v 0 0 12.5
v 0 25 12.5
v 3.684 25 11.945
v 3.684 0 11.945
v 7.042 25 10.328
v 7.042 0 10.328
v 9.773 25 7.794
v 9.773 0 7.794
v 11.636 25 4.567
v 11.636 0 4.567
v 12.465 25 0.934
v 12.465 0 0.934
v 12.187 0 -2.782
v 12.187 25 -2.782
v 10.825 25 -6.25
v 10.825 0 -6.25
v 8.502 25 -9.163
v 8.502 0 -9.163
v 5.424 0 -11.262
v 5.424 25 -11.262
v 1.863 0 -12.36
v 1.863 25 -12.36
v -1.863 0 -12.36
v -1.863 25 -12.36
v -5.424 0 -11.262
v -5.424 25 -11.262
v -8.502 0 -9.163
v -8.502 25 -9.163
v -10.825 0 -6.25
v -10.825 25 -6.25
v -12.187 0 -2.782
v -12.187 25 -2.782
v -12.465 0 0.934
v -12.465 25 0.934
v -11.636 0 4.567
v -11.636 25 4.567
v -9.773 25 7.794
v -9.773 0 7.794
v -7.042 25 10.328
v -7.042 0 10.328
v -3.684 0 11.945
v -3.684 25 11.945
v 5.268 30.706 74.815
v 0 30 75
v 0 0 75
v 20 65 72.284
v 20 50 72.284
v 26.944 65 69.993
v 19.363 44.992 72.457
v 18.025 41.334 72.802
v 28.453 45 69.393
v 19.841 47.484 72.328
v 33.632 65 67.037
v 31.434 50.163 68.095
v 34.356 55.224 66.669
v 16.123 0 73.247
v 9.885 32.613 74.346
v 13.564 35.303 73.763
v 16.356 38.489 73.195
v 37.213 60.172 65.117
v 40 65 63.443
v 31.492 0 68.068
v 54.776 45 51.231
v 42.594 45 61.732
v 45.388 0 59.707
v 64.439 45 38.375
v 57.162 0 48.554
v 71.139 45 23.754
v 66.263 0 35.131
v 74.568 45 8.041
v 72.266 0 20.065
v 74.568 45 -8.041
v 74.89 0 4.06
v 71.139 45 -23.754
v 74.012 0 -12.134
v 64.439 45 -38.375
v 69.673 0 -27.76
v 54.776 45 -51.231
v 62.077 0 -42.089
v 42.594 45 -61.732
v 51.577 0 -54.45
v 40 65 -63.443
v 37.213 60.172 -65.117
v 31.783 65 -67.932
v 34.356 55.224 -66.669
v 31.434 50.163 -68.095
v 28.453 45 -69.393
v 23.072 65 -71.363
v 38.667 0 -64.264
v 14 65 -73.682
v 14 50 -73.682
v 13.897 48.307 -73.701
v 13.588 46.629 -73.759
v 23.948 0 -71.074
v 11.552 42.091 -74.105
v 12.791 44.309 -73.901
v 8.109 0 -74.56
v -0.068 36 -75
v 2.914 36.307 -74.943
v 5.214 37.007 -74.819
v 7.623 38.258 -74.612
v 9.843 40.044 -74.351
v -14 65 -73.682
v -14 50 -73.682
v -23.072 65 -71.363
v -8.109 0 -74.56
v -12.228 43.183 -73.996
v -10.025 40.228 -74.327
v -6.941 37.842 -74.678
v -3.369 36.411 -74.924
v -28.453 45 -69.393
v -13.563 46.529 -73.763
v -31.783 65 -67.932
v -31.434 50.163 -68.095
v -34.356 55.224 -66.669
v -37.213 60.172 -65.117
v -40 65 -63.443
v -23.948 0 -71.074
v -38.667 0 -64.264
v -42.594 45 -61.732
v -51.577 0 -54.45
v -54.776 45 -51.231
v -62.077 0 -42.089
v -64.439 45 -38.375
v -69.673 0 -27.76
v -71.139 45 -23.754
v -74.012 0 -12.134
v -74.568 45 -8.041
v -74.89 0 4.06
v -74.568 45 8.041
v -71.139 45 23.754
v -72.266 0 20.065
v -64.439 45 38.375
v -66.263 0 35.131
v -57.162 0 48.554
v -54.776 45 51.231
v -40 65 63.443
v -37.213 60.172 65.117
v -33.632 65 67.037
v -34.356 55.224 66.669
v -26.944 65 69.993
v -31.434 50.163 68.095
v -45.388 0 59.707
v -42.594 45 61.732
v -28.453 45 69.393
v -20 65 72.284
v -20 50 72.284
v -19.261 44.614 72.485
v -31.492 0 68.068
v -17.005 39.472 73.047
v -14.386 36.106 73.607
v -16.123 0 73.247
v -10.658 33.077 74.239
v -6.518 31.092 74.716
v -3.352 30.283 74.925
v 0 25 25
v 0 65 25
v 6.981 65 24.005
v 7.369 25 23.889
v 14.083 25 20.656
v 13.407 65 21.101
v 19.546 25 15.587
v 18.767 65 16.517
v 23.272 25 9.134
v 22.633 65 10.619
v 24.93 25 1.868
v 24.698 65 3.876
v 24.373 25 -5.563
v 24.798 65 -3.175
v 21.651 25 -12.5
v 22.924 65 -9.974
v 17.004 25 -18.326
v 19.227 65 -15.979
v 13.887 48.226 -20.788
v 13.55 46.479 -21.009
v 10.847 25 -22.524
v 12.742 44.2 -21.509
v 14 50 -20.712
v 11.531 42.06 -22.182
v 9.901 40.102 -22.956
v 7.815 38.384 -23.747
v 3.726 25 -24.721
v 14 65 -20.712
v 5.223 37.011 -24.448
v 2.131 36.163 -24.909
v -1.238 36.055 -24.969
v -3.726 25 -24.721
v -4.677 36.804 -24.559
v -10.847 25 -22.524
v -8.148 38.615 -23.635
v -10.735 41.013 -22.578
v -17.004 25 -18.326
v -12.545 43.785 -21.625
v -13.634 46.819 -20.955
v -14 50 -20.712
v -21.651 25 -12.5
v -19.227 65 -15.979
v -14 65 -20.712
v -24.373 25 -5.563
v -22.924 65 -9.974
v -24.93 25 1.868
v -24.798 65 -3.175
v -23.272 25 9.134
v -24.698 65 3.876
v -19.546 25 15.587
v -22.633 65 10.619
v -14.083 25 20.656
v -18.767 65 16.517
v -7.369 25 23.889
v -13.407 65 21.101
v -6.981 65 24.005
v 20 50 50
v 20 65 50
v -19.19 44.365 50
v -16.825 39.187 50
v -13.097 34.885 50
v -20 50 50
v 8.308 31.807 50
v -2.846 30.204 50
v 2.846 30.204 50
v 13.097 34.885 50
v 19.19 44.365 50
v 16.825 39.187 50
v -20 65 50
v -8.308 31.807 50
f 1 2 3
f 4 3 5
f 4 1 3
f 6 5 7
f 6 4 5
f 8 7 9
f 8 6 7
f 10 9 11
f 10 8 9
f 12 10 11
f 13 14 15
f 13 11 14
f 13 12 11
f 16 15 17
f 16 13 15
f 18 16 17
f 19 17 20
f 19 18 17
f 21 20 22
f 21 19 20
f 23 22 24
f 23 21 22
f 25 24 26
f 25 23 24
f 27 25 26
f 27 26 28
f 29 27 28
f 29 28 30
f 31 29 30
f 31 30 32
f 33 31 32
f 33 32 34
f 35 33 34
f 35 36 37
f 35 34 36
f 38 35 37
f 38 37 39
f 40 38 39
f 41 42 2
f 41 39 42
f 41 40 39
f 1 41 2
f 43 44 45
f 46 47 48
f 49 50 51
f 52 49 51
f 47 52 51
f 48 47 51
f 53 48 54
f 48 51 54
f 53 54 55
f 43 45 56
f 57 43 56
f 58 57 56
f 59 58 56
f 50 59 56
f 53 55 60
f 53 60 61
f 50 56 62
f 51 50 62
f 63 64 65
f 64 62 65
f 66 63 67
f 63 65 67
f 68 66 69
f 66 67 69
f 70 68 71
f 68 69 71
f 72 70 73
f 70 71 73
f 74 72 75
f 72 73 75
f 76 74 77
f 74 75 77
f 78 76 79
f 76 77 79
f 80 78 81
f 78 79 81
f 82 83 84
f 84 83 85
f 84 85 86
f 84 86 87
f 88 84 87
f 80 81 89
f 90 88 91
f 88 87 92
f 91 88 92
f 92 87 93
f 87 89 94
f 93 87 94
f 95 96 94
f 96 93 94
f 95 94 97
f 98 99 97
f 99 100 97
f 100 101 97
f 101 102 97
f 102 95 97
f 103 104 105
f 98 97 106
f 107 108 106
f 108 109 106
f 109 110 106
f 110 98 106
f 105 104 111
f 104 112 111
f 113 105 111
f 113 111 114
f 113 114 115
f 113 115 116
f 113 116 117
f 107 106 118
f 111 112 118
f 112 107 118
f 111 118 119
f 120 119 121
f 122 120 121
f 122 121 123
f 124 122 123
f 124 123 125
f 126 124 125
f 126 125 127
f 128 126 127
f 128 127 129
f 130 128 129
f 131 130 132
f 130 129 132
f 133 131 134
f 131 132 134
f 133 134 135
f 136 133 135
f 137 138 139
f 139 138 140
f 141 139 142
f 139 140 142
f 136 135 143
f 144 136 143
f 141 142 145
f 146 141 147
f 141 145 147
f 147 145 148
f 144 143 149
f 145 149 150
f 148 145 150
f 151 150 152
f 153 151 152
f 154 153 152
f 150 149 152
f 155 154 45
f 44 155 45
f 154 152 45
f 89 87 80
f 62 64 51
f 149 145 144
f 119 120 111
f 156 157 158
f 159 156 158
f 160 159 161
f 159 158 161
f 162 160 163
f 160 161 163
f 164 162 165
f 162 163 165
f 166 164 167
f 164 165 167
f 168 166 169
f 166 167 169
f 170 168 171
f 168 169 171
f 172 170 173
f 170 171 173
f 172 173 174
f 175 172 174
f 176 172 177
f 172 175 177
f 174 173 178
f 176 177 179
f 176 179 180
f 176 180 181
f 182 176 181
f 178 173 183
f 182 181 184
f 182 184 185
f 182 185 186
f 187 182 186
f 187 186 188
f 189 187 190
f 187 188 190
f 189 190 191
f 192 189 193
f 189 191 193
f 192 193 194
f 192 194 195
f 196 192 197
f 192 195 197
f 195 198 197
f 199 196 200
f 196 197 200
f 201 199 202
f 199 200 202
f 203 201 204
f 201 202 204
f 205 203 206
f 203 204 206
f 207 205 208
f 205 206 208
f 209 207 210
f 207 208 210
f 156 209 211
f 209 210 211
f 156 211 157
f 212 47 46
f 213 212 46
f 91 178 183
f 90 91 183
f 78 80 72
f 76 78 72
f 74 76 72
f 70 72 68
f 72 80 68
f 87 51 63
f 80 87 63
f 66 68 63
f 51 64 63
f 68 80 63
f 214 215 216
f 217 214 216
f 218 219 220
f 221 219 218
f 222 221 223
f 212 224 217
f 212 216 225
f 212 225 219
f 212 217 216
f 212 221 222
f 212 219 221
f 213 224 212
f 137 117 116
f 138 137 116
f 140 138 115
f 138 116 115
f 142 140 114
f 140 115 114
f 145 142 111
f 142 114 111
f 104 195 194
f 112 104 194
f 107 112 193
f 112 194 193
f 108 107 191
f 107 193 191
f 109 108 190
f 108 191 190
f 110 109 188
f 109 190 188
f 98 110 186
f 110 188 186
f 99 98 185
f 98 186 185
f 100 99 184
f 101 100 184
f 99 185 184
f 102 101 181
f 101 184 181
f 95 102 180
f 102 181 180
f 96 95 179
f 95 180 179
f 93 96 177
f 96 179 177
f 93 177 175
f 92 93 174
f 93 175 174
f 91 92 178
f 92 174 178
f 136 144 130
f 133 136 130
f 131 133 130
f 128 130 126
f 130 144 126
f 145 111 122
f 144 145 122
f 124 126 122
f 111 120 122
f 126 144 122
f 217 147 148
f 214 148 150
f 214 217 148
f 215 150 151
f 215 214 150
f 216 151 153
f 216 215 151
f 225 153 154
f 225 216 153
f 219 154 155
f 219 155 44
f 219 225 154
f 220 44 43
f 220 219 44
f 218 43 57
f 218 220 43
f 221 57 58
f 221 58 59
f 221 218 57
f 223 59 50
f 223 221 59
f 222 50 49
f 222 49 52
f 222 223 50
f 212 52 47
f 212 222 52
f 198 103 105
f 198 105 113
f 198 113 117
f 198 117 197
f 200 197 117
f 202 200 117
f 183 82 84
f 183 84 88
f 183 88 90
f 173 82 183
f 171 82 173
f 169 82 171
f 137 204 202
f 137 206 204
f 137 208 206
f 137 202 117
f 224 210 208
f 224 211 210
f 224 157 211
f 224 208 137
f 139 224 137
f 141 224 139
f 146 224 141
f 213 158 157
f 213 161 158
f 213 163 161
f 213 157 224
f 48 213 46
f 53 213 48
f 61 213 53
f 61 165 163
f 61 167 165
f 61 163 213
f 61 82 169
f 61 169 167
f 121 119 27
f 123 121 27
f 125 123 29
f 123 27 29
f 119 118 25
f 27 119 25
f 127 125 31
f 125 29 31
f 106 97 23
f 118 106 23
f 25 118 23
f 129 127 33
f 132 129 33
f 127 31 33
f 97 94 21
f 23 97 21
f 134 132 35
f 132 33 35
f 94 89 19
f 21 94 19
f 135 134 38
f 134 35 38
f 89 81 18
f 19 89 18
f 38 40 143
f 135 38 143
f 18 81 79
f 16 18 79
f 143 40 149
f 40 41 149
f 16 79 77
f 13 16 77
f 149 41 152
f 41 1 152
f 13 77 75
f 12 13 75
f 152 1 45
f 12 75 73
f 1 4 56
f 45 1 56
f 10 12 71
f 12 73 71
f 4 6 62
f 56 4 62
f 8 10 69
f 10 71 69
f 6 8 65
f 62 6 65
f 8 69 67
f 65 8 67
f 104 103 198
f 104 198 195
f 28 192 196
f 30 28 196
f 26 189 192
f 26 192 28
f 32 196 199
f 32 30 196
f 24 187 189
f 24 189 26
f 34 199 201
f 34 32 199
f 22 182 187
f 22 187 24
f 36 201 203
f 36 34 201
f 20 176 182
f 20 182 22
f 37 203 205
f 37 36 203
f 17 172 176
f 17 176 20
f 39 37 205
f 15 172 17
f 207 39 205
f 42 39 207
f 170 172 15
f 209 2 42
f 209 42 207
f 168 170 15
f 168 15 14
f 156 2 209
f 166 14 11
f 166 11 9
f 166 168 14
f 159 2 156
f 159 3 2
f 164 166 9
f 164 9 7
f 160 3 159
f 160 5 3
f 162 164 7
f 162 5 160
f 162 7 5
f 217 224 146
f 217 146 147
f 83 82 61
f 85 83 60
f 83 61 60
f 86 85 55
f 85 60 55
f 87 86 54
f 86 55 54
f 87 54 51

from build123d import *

# Parameters (mm, degrees)
SKETCH2_R           = 75
SKETCH2_R_2         = 12.5
BOSS_EXTRUDE1_DEPTH = 65
SKETCH3_R           = 14
CUT_EXTRUDE1_DEPTH  = 89
SKETCH4_R           = 25
CUT_EXTRUDE2_DEPTH  = 40
CUT_EXTRUDE3_DEPTH  = 97.5
SKETCH7_R           = 20
CUT_EXTRUDE4_DEPTH  = 73


with BuildPart() as part:
    # Sketch2 → Boss-Extrude1 (new body)
    with BuildSketch(Plane(origin=(0, 0, 0), x_dir=(1, 0, 0), z_dir=(0, 1, 0))):
        with Locations(Location((0, 0, 0), (0, 0, 270))):
            Circle(SKETCH2_R)
        with Locations(Location((0, 0, 0), (0, 0, 270))):
            Circle(SKETCH2_R_2, mode=Mode.SUBTRACT)
    extrude(amount=BOSS_EXTRUDE1_DEPTH)

    # Sketch3 → Cut-Extrude1 (cut)
    with BuildSketch(Plane.XY):
        with BuildLine():
            Line((-14, 77.852422798), (-14, 50))
            ThreePointArc((-14, 50), (0, 64), (14, 50))
            Line((14, 50), (14, 77.852422798))
            Line((14, 77.852422798), (-14, 77.852422798))
        make_face()
        with Locations((0, 50)):
            Circle(SKETCH3_R)
    extrude(amount=-CUT_EXTRUDE1_DEPTH, mode=Mode.SUBTRACT)

    # Sketch4 → Cut-Extrude2 (cut)
    with BuildSketch(Plane(origin=(0, 65, 0), x_dir=(1, 0, 0), z_dir=(0, 1, 0))):
        with Locations(Location((0, 0, 0), (0, 0, 270))):
            Circle(SKETCH4_R)
    extrude(amount=-CUT_EXTRUDE2_DEPTH, mode=Mode.SUBTRACT)

    # Sketch5 → Cut-Extrude3 (cut, symmetric)
    with BuildSketch(Plane.XY):
        Polygon((-75, 65), (-40, 65), (-28.452994616, 45), (-75, 45), align=None)
        Polygon((75, 65), (40, 65), (28.452994616, 45), (75, 45), align=None)
    extrude(amount=CUT_EXTRUDE3_DEPTH, both=True, mode=Mode.SUBTRACT)

    # Sketch7 → Cut-Extrude4 (cut)
    with BuildSketch(Plane.XY.offset(50)):
        with Locations((0, 50)):
            Circle(SKETCH7_R)
        with BuildLine():
            Line((-20, 82.212313003), (-20, 50))
            ThreePointArc((-20, 50), (0, 70), (20, 50))
            Line((20, 50), (20, 82.212313003))
            Line((20, 82.212313003), (-20, 82.212313003))
        make_face()
    extrude(amount=CUT_EXTRUDE4_DEPTH, mode=Mode.SUBTRACT)


solid = part.part
